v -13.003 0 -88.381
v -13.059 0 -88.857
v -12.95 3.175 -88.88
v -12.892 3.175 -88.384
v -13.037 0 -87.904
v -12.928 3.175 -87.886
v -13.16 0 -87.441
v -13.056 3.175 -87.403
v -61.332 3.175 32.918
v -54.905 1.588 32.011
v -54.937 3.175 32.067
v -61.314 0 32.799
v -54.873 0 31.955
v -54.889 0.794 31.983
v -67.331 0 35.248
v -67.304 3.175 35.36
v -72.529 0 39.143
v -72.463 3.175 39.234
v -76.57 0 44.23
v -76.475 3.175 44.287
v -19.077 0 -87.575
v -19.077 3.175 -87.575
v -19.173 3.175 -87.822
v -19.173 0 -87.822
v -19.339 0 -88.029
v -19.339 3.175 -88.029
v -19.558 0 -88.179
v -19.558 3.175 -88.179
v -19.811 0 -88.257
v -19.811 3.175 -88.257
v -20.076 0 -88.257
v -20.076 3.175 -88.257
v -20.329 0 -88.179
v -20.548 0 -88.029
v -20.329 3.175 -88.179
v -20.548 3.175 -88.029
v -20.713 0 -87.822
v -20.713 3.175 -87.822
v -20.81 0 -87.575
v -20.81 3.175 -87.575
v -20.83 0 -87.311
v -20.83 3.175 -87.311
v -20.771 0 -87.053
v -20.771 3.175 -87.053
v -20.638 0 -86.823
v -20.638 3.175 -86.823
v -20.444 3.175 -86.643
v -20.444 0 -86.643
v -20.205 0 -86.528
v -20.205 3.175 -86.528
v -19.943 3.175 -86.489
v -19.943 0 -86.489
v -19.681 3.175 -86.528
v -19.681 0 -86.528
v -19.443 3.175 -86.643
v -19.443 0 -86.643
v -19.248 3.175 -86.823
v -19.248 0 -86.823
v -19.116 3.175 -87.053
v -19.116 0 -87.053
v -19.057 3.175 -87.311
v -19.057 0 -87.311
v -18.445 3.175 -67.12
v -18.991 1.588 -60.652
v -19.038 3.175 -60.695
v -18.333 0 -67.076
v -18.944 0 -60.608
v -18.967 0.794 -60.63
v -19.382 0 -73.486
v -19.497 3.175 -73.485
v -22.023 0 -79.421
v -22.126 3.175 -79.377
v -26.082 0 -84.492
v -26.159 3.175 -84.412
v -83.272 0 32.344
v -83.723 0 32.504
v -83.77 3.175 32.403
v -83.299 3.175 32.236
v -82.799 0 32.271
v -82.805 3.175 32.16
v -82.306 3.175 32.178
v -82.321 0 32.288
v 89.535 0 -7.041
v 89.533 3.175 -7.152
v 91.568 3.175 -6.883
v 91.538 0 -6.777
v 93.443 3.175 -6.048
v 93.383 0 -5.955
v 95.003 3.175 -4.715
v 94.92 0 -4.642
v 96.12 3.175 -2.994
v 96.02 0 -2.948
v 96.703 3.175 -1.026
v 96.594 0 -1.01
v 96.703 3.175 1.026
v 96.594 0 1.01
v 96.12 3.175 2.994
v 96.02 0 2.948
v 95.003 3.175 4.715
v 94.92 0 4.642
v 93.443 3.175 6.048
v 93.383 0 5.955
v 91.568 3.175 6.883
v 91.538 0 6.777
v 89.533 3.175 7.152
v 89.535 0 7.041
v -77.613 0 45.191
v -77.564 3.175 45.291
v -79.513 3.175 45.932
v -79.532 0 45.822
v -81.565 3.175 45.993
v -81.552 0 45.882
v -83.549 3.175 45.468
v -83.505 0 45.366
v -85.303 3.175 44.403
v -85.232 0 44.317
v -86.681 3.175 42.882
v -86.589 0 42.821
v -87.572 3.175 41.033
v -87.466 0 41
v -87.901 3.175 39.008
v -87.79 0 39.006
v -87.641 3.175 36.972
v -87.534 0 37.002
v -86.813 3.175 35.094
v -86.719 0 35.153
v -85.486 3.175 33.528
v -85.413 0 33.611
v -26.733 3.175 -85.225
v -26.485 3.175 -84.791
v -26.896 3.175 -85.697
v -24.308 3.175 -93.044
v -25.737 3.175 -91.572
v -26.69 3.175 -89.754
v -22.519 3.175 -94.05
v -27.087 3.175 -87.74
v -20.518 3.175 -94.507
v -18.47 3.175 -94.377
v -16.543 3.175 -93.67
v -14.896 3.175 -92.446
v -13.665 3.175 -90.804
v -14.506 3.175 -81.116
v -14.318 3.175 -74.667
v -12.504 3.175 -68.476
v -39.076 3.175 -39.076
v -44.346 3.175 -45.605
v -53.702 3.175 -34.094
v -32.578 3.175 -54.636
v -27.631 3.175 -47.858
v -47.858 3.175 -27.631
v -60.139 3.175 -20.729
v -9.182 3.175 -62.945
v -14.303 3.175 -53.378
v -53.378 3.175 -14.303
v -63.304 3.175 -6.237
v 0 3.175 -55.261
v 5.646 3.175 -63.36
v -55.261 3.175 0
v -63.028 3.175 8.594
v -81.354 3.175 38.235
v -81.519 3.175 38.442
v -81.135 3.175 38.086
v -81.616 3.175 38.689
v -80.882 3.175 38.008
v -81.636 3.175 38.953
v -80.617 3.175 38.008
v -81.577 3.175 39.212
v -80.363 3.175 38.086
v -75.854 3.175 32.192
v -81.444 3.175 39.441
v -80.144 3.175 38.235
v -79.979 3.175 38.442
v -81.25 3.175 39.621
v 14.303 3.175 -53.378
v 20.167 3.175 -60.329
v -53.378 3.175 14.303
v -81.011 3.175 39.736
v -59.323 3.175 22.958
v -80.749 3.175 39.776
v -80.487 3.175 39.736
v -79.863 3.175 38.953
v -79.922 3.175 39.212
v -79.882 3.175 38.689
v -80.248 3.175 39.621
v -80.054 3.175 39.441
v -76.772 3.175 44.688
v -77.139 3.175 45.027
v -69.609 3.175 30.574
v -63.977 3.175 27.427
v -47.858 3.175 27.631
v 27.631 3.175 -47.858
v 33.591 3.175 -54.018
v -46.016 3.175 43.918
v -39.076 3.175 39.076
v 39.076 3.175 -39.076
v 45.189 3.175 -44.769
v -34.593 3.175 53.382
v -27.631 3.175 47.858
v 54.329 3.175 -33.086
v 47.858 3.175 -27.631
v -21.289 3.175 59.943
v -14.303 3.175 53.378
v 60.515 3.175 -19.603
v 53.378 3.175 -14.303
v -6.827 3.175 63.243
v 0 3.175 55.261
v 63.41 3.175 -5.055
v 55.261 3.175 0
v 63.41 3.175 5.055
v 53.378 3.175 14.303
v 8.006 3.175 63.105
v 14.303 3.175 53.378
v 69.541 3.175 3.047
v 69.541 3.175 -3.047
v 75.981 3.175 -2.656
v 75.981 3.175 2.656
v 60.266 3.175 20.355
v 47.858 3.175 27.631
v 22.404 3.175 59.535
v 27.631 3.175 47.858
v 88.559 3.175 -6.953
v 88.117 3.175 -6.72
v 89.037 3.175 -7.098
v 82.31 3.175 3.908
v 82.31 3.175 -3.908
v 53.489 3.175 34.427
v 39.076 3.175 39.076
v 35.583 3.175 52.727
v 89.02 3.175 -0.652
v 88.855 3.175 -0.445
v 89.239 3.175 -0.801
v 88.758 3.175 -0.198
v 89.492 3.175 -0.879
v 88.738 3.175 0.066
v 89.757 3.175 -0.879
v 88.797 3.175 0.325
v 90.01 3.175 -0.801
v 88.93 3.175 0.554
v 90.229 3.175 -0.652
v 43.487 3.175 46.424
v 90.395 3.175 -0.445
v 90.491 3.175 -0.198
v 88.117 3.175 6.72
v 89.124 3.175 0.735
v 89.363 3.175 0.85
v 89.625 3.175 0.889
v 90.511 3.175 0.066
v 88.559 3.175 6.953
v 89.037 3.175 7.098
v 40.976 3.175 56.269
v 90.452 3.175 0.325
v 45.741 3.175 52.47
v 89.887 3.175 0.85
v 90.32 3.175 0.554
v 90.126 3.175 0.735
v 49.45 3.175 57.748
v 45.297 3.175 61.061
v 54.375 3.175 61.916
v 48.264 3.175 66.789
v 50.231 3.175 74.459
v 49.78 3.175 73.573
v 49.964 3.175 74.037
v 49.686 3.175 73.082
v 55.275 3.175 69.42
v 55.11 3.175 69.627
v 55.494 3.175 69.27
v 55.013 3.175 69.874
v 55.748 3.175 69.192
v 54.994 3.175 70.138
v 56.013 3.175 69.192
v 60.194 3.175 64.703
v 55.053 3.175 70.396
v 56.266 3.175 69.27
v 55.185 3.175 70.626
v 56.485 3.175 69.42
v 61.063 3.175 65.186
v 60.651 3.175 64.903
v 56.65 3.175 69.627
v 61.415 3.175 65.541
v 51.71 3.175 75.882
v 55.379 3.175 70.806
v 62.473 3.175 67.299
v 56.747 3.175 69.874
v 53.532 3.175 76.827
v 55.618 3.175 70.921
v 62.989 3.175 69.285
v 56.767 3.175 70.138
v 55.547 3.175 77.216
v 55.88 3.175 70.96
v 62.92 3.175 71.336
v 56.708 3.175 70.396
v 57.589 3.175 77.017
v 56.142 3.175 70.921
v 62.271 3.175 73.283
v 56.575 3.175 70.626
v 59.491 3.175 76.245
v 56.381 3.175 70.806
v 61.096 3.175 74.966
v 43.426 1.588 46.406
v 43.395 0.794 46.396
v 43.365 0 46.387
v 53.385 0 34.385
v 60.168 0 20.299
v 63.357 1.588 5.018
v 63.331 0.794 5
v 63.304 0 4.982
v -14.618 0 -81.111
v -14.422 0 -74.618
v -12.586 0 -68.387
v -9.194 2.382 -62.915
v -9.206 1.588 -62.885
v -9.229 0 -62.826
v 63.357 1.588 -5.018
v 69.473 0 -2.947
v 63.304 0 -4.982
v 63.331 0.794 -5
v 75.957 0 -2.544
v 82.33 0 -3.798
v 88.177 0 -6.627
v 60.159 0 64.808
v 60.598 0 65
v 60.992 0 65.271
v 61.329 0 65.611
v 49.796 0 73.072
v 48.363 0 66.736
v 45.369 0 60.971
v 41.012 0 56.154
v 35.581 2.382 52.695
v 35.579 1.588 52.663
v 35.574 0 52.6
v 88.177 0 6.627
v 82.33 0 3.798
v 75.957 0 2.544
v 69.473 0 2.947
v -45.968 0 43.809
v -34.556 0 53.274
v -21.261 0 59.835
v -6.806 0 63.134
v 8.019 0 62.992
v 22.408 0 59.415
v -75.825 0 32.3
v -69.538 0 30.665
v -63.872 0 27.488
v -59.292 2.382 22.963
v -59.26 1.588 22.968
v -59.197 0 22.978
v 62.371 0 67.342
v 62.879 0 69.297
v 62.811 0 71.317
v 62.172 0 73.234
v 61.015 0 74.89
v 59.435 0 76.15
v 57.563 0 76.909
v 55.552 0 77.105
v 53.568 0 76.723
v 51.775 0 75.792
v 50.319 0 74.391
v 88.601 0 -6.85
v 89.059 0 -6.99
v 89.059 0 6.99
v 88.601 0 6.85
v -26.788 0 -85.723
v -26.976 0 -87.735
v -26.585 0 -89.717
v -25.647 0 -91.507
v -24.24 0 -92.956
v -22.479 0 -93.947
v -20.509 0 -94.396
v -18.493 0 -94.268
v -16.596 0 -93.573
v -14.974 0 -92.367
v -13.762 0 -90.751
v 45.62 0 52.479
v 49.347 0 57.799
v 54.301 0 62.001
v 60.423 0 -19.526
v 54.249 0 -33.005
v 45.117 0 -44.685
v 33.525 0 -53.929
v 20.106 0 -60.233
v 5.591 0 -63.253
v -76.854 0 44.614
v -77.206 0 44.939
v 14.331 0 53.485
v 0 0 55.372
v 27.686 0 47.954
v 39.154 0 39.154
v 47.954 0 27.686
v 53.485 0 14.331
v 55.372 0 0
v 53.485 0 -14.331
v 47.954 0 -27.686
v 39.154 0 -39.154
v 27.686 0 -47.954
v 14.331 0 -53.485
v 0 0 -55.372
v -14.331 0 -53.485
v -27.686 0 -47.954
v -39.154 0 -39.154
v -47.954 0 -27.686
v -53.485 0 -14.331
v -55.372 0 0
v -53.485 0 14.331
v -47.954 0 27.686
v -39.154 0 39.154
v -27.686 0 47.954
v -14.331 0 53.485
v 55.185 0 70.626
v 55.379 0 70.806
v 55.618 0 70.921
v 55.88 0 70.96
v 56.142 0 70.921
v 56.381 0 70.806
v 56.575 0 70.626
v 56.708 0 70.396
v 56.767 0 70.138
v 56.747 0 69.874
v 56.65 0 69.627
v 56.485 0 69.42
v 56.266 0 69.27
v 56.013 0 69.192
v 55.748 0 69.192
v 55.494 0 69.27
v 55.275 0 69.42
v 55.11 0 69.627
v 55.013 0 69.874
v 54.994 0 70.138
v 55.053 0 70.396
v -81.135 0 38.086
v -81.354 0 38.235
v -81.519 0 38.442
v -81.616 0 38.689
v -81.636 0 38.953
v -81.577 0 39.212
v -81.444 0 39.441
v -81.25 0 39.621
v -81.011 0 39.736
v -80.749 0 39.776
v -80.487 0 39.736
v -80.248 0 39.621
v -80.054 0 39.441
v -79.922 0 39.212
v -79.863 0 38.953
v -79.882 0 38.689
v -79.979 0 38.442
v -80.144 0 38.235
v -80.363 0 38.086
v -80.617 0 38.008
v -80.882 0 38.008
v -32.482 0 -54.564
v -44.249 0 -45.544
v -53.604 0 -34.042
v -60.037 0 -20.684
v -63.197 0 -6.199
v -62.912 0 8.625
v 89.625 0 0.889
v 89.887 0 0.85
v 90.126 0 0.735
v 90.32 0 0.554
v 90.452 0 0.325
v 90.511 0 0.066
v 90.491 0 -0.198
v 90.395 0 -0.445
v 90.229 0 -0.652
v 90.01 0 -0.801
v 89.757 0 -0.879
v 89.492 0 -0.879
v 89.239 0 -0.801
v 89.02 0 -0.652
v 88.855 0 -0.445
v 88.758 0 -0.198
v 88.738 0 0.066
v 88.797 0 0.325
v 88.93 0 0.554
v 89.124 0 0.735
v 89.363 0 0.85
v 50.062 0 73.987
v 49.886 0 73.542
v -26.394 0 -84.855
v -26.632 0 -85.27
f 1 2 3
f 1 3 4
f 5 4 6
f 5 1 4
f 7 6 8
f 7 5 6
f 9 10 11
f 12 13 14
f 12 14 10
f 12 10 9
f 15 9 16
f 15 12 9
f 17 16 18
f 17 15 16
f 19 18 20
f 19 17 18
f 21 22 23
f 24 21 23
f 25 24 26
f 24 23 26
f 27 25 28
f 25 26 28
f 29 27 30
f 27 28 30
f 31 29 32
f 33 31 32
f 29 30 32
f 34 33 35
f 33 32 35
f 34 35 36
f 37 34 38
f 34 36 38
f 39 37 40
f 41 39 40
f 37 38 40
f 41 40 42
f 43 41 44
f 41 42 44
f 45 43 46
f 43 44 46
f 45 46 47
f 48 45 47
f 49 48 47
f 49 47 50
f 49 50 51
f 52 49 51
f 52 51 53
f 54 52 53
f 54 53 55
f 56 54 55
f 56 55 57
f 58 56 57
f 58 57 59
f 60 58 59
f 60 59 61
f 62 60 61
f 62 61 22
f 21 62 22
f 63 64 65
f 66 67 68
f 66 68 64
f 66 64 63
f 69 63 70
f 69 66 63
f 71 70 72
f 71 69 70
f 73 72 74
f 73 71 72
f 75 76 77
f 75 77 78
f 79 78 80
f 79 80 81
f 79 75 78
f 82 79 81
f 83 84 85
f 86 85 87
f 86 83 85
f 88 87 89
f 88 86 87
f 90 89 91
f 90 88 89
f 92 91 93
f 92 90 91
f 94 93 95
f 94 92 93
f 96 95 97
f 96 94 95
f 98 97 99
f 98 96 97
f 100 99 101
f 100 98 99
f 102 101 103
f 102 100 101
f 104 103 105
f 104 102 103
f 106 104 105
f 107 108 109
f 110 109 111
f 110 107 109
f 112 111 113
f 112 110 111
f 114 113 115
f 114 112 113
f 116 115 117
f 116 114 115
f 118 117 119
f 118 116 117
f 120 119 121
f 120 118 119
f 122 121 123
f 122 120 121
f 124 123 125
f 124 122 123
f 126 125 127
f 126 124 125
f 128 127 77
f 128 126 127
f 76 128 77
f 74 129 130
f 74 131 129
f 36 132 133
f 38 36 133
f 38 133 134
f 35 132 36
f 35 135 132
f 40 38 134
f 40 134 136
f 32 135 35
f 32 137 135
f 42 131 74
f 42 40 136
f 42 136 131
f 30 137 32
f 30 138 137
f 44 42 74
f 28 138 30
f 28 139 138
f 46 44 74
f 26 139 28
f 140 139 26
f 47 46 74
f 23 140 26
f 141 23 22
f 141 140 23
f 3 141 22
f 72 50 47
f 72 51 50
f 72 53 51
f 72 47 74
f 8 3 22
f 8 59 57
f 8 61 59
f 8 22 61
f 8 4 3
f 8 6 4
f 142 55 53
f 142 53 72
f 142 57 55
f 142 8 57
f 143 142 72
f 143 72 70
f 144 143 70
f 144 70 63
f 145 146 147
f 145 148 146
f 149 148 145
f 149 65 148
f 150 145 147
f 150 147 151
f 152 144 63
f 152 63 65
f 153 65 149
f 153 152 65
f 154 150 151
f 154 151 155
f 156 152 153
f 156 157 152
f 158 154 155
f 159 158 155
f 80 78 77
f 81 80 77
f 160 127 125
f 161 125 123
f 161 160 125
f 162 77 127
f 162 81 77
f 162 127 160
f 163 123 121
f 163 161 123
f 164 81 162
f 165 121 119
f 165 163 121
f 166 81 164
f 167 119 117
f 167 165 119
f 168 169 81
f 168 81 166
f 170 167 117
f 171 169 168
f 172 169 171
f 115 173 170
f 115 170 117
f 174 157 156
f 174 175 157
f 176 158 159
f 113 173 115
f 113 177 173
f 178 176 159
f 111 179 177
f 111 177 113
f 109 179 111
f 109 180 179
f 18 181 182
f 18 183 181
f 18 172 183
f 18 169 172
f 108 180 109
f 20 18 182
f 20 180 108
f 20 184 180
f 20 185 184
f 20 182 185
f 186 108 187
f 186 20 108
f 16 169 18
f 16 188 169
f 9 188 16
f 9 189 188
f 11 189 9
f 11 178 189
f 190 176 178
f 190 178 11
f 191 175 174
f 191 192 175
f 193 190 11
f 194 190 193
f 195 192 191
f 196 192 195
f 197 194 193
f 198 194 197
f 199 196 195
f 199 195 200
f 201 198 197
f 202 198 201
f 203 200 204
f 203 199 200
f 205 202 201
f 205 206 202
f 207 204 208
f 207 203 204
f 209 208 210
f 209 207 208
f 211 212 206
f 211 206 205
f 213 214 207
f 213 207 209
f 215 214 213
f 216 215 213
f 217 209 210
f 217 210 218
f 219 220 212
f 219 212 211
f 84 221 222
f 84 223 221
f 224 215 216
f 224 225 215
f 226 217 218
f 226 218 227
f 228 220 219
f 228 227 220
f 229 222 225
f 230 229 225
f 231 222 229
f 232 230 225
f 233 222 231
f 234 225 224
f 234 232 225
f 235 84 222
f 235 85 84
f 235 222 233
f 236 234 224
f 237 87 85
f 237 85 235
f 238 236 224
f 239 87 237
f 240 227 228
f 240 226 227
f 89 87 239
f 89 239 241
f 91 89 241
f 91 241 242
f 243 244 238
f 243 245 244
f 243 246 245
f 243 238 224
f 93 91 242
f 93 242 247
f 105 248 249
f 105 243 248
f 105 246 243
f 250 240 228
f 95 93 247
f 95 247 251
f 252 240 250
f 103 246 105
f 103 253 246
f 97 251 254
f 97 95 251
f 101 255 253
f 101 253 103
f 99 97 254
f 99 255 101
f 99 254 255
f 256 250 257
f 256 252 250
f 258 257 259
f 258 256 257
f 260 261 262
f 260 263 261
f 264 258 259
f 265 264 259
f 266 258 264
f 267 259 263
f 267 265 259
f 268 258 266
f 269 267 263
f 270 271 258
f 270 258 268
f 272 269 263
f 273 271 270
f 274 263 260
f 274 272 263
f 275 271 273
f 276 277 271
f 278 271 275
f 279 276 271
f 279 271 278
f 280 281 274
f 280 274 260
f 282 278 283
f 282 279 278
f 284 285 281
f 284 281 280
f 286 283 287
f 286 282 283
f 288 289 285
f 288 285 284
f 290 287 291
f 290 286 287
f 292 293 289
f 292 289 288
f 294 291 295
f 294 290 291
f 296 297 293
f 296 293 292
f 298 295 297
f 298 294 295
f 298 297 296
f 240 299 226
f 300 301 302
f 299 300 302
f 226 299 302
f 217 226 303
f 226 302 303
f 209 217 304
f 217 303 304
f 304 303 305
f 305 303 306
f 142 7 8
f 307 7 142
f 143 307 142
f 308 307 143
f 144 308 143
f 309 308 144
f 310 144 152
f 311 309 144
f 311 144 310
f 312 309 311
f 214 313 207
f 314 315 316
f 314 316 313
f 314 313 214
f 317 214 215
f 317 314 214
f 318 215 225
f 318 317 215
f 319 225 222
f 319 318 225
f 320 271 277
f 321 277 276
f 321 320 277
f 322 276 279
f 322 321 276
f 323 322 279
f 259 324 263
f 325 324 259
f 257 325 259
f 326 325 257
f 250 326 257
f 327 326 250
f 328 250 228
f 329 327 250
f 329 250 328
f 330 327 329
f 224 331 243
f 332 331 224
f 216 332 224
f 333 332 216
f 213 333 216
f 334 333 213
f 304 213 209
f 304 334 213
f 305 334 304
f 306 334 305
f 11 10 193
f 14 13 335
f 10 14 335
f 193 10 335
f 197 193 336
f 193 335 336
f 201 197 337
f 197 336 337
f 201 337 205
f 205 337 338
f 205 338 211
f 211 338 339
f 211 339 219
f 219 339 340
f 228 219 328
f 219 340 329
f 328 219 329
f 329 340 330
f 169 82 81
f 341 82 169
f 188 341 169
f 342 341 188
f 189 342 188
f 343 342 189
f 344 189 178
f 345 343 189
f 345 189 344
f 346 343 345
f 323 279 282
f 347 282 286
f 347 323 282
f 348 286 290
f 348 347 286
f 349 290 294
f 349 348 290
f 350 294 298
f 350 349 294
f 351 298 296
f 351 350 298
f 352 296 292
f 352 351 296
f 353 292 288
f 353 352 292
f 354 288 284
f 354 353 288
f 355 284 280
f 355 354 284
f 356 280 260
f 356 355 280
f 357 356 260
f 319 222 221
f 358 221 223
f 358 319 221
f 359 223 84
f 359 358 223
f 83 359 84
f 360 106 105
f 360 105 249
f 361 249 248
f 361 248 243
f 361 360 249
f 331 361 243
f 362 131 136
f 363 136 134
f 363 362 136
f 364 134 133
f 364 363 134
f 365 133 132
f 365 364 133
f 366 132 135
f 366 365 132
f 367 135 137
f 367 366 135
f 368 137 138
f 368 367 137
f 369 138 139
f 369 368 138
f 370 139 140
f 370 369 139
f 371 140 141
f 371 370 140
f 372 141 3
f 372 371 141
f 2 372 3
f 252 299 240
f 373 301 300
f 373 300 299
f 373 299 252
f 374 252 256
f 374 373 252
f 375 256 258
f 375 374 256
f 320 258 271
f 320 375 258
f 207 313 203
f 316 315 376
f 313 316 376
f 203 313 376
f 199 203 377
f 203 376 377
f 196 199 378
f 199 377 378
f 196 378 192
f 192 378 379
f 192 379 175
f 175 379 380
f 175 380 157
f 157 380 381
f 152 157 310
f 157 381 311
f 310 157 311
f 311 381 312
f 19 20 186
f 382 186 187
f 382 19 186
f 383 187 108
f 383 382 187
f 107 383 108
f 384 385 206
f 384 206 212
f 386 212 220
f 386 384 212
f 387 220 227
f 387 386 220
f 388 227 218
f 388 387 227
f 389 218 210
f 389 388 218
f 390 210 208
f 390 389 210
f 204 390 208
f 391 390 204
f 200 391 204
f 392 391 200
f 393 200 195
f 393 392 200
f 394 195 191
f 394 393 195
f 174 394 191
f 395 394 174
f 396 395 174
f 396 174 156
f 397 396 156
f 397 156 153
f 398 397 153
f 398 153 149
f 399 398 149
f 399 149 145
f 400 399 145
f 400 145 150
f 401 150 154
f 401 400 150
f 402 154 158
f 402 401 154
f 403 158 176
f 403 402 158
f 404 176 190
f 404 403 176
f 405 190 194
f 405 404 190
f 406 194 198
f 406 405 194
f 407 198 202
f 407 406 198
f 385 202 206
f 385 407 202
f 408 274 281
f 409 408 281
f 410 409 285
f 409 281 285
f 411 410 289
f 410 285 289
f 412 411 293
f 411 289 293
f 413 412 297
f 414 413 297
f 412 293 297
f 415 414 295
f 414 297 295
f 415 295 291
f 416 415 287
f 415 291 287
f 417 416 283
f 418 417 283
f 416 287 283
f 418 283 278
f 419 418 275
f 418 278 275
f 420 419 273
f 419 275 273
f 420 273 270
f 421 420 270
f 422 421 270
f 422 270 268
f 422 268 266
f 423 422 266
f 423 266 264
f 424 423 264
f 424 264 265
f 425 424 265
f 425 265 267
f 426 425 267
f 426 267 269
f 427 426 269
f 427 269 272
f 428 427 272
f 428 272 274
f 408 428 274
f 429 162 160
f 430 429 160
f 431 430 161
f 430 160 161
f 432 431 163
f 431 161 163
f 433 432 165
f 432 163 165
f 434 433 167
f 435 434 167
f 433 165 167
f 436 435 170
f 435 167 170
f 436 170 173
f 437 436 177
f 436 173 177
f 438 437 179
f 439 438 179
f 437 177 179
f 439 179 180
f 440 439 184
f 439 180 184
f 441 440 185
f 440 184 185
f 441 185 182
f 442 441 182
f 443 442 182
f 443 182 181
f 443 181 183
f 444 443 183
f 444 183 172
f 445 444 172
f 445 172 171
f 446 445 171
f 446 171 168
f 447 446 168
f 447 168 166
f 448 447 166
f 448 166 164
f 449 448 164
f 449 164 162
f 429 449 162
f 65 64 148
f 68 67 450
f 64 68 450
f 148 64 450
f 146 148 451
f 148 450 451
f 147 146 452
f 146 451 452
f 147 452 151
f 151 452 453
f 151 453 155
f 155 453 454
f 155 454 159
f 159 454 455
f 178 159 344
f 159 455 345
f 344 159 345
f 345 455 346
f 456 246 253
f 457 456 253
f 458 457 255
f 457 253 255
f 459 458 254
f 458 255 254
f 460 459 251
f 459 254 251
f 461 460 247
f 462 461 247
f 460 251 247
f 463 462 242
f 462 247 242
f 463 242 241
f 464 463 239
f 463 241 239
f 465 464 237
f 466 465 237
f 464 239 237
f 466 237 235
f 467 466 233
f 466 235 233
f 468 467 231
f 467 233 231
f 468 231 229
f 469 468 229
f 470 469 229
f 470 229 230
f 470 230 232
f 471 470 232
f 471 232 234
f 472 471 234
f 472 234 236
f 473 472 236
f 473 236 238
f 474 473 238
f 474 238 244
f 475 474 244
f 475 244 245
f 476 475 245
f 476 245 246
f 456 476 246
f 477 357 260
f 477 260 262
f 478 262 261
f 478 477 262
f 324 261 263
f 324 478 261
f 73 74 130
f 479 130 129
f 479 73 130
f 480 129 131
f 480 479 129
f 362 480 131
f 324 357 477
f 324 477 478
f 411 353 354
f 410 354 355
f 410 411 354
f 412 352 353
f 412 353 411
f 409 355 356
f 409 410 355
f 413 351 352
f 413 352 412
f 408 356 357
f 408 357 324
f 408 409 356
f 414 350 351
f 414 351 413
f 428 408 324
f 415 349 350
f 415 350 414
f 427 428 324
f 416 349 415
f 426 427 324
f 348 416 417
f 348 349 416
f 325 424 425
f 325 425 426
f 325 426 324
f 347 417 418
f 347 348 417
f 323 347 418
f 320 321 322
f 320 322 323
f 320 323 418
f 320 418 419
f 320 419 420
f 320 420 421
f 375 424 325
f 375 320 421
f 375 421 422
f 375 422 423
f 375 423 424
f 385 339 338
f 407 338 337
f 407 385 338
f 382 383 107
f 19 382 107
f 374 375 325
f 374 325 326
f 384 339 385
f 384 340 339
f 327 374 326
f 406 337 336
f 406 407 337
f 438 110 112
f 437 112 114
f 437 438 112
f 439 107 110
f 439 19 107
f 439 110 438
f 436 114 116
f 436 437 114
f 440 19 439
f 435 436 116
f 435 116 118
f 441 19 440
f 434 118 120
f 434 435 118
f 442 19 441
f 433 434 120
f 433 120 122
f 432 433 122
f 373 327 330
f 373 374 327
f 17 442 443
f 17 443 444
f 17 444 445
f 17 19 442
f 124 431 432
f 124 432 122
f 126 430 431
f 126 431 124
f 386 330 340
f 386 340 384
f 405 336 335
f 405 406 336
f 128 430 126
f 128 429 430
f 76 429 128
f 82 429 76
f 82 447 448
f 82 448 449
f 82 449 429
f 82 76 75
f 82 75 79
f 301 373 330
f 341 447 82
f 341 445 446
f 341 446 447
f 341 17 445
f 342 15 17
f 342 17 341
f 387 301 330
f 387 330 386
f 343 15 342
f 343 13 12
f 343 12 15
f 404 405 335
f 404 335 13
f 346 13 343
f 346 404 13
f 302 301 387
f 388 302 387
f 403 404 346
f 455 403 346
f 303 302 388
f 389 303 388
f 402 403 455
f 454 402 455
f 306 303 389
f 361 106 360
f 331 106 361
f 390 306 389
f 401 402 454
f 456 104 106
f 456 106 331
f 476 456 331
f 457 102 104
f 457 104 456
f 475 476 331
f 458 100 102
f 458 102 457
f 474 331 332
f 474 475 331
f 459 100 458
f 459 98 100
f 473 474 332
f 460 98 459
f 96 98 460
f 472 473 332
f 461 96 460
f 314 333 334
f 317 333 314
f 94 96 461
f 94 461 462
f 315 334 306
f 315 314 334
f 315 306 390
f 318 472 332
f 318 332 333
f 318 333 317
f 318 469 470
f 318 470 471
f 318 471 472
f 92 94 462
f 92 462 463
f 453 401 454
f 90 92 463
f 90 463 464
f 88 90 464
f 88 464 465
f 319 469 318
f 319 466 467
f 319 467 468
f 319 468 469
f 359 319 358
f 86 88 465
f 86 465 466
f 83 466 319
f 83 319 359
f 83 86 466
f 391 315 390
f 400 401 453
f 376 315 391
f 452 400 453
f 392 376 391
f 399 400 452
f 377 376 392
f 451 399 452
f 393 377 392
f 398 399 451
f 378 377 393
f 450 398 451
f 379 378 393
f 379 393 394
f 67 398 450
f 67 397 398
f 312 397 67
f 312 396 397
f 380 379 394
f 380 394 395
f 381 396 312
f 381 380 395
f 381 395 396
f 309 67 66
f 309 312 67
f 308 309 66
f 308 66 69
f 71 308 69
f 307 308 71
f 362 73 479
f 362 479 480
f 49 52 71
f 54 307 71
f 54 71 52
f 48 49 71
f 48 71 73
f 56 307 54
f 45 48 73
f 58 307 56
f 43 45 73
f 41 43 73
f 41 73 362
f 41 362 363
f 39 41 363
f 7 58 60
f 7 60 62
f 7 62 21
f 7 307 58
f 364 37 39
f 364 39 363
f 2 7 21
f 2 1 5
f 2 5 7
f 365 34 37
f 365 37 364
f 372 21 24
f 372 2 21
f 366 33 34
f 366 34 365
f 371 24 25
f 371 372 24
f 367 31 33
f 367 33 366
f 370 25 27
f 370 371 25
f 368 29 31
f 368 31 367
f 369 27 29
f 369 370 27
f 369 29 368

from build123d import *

# Parameters (mm, degrees)
SKETCH1_R                      = 63.5
SKETCH1_R_2                    = 55.372
BOSS_EXTRUDE1_DEPTH            = 3.175
BOSS_EXTRUDE2_DEPTH            = 3.175
SKETCH37_R                     = 0.889
CUT_EXTRUDE19_DEPTH            = 116.700962847
DRAFT20_ANGLE                  = 2
DRAFT21_ANGLE                  = 2
CIRPATTERN7_COUNT              = 7
DRAFT21_OF_CIRPATTERN7_2_ANGLE = 2
DRAFT21_OF_CIRPATTERN7_3_ANGLE = 2
DRAFT21_OF_CIRPATTERN7_4_ANGLE = 2


with BuildPart() as part:
    # Sketch1 → Boss-Extrude1 (new body)
    with BuildSketch(Plane(origin=(0, 0, 0), x_dir=(1, 0, 0), z_dir=(0, 1, 0))):
        with Locations(Location((0, 0, 0), (0, 0, 270))):
            Circle(SKETCH1_R)
        with Locations(Location((0, 0, 0), (0, 0, 270))):
            Circle(SKETCH1_R_2, mode=Mode.SUBTRACT)
    extrude(amount=BOSS_EXTRUDE1_DEPTH)

    # Sketch2 → Boss-Extrude2 (add)
    with BuildSketch(Plane(origin=(0, 0, 0), x_dir=(1, 0, 0), z_dir=(0, 1, 0))):
        with BuildLine():
            ThreePointArc((63.304250692, -4.982152579), (63.5, 0), (63.304250692, 4.982152579))
            ThreePointArc((63.304250692, 4.982152579), (75.956520603, 2.543628775), (88.177394932, 6.627323532))
            ThreePointArc((88.177394932, 6.627323532), (88.826525295, 6.930865115), (89.534602282, 7.04102274))
            ThreePointArc((89.534602282, 7.04102274), (96.666344602, 0), (89.534602282, -7.04102274))
            ThreePointArc((89.534602282, -7.04102274), (88.826525295, -6.930865115), (88.177394932, -6.627323532))
            ThreePointArc((88.177394932, -6.627323532), (75.956520603, -2.543628775), (63.304250692, -4.982152579))
        make_face()
    boss_extrude2 = extrude(amount=BOSS_EXTRUDE2_DEPTH)

    # Sketch37 → Cut-Extrude19 (cut, through all)
    with BuildSketch(Plane(origin=(0, 3.175, 0), x_dir=(1, 0, 0), z_dir=(0, 1, 0))):
        with Locations(Location((89.624744861, 0, 0), (0, 0, 270))):
            Circle(SKETCH37_R)
    cut_extrude19 = extrude(amount=-CUT_EXTRUDE19_DEPTH, mode=Mode.SUBTRACT)

    # Draft20
    draft20_faces = [part.faces().sort_by_distance(p)[0] for p in [
        (0, 1.5875, -55.372),
        (-63.5, 1.5875, 0),
    ]]
    draft(draft20_faces, Plane(origin=(0, 0, 0), x_dir=(0, 0, -1), z_dir=(0, -1, 0)), DRAFT20_ANGLE)

    # Draft21
    draft21_faces = [part.faces().sort_by_distance(p)[0] for p in [
        (88.826525295, 1.5875, 6.930865115),
        (75.956520603, 1.587499999, 2.543628775),
        (88.826525295, 1.5875, -6.930865115),
        (96.666344602, 1.5875, 0),
        (75.956520603, 1.5875, -2.543628775),
    ]]
    draft(draft21_faces, Plane(origin=(0, 0, 0), x_dir=(0, 0, -1), z_dir=(0, -1, 0)), DRAFT21_ANGLE)

    # CirPattern7: Boss-Extrude2, Cut-Extrude19 ×7 about axis, 3 skipped
    cirpattern7_axis = Axis((0, 0, 0), (0, -1, 0))
    add([boss_extrude2.rotate(cirpattern7_axis, i * 360 / CIRPATTERN7_COUNT) for i in range(1, CIRPATTERN7_COUNT) if i not in (2, 4, 6)])
    add([cut_extrude19.rotate(cirpattern7_axis, i * 360 / CIRPATTERN7_COUNT) for i in range(1, CIRPATTERN7_COUNT) if i not in (2, 4, 6)], mode=Mode.SUBTRACT)

    # Draft21 of CirPattern7 2
    draft21_of_cirpattern7_2_faces = [part.faces().sort_by_distance(p)[0] for p in [
        (49.963664108, 1.5875, 73.768697671),
        (45.369426924, 1.587499999, 60.971125707),
        (60.801201204, 1.5875, 65.126050237),
        (60.270480042, 1.5875, 75.576791505),
        (49.346805037, 1.5875, 57.799272505),
    ]]
    draft(draft21_of_cirpattern7_2_faces, Plane(origin=(0, 0, 0), x_dir=(0.7818314824680298, 0, -0.6234898018587336), z_dir=(0, -1, 0)), DRAFT21_OF_CIRPATTERN7_2_ANGLE)

    # Draft21 of CirPattern7 3
    draft21_of_cirpattern7_3_faces = [part.faces().sort_by_distance(p)[0] for p in [
        (-83.037123606, 1.5875, 32.295891232),
        (-69.538099541, 1.587499999, 30.664568831),
        (-77.022744263, 1.5875, 44.784878624),
        (-87.09336706, 1.5875, 41.941955043),
        (-67.330821213, 1.5875, 35.248029508),
    ]]
    draft(draft21_of_cirpattern7_3_faces, Plane(origin=(0, 0, 0), x_dir=(0.43388373911755823, 0, 0.900968867902419), z_dir=(0, -1, 0)), DRAFT21_OF_CIRPATTERN7_3_ANGLE)

    # Draft21 of CirPattern7 4
    draft21_of_cirpattern7_4_faces = [part.faces().sort_by_distance(p)[0] for p in [
        (-13.008667512, 1.5875, -88.141721431),
        (-14.422061213, 1.587499999, -74.618142699),
        (-26.522855225, 1.5875, -85.057196274),
        (-21.510285283, 1.5875, -94.242717521),
        (-19.381770596, 1.5875, -73.486121397),
    ]]
    draft(draft21_of_cirpattern7_4_faces, Plane(origin=(0, 0, 0), x_dir=(-0.9749279121818237, 0, 0.2225209339563137), z_dir=(0, -1, 0)), DRAFT21_OF_CIRPATTERN7_4_ANGLE)


solid = part.part
